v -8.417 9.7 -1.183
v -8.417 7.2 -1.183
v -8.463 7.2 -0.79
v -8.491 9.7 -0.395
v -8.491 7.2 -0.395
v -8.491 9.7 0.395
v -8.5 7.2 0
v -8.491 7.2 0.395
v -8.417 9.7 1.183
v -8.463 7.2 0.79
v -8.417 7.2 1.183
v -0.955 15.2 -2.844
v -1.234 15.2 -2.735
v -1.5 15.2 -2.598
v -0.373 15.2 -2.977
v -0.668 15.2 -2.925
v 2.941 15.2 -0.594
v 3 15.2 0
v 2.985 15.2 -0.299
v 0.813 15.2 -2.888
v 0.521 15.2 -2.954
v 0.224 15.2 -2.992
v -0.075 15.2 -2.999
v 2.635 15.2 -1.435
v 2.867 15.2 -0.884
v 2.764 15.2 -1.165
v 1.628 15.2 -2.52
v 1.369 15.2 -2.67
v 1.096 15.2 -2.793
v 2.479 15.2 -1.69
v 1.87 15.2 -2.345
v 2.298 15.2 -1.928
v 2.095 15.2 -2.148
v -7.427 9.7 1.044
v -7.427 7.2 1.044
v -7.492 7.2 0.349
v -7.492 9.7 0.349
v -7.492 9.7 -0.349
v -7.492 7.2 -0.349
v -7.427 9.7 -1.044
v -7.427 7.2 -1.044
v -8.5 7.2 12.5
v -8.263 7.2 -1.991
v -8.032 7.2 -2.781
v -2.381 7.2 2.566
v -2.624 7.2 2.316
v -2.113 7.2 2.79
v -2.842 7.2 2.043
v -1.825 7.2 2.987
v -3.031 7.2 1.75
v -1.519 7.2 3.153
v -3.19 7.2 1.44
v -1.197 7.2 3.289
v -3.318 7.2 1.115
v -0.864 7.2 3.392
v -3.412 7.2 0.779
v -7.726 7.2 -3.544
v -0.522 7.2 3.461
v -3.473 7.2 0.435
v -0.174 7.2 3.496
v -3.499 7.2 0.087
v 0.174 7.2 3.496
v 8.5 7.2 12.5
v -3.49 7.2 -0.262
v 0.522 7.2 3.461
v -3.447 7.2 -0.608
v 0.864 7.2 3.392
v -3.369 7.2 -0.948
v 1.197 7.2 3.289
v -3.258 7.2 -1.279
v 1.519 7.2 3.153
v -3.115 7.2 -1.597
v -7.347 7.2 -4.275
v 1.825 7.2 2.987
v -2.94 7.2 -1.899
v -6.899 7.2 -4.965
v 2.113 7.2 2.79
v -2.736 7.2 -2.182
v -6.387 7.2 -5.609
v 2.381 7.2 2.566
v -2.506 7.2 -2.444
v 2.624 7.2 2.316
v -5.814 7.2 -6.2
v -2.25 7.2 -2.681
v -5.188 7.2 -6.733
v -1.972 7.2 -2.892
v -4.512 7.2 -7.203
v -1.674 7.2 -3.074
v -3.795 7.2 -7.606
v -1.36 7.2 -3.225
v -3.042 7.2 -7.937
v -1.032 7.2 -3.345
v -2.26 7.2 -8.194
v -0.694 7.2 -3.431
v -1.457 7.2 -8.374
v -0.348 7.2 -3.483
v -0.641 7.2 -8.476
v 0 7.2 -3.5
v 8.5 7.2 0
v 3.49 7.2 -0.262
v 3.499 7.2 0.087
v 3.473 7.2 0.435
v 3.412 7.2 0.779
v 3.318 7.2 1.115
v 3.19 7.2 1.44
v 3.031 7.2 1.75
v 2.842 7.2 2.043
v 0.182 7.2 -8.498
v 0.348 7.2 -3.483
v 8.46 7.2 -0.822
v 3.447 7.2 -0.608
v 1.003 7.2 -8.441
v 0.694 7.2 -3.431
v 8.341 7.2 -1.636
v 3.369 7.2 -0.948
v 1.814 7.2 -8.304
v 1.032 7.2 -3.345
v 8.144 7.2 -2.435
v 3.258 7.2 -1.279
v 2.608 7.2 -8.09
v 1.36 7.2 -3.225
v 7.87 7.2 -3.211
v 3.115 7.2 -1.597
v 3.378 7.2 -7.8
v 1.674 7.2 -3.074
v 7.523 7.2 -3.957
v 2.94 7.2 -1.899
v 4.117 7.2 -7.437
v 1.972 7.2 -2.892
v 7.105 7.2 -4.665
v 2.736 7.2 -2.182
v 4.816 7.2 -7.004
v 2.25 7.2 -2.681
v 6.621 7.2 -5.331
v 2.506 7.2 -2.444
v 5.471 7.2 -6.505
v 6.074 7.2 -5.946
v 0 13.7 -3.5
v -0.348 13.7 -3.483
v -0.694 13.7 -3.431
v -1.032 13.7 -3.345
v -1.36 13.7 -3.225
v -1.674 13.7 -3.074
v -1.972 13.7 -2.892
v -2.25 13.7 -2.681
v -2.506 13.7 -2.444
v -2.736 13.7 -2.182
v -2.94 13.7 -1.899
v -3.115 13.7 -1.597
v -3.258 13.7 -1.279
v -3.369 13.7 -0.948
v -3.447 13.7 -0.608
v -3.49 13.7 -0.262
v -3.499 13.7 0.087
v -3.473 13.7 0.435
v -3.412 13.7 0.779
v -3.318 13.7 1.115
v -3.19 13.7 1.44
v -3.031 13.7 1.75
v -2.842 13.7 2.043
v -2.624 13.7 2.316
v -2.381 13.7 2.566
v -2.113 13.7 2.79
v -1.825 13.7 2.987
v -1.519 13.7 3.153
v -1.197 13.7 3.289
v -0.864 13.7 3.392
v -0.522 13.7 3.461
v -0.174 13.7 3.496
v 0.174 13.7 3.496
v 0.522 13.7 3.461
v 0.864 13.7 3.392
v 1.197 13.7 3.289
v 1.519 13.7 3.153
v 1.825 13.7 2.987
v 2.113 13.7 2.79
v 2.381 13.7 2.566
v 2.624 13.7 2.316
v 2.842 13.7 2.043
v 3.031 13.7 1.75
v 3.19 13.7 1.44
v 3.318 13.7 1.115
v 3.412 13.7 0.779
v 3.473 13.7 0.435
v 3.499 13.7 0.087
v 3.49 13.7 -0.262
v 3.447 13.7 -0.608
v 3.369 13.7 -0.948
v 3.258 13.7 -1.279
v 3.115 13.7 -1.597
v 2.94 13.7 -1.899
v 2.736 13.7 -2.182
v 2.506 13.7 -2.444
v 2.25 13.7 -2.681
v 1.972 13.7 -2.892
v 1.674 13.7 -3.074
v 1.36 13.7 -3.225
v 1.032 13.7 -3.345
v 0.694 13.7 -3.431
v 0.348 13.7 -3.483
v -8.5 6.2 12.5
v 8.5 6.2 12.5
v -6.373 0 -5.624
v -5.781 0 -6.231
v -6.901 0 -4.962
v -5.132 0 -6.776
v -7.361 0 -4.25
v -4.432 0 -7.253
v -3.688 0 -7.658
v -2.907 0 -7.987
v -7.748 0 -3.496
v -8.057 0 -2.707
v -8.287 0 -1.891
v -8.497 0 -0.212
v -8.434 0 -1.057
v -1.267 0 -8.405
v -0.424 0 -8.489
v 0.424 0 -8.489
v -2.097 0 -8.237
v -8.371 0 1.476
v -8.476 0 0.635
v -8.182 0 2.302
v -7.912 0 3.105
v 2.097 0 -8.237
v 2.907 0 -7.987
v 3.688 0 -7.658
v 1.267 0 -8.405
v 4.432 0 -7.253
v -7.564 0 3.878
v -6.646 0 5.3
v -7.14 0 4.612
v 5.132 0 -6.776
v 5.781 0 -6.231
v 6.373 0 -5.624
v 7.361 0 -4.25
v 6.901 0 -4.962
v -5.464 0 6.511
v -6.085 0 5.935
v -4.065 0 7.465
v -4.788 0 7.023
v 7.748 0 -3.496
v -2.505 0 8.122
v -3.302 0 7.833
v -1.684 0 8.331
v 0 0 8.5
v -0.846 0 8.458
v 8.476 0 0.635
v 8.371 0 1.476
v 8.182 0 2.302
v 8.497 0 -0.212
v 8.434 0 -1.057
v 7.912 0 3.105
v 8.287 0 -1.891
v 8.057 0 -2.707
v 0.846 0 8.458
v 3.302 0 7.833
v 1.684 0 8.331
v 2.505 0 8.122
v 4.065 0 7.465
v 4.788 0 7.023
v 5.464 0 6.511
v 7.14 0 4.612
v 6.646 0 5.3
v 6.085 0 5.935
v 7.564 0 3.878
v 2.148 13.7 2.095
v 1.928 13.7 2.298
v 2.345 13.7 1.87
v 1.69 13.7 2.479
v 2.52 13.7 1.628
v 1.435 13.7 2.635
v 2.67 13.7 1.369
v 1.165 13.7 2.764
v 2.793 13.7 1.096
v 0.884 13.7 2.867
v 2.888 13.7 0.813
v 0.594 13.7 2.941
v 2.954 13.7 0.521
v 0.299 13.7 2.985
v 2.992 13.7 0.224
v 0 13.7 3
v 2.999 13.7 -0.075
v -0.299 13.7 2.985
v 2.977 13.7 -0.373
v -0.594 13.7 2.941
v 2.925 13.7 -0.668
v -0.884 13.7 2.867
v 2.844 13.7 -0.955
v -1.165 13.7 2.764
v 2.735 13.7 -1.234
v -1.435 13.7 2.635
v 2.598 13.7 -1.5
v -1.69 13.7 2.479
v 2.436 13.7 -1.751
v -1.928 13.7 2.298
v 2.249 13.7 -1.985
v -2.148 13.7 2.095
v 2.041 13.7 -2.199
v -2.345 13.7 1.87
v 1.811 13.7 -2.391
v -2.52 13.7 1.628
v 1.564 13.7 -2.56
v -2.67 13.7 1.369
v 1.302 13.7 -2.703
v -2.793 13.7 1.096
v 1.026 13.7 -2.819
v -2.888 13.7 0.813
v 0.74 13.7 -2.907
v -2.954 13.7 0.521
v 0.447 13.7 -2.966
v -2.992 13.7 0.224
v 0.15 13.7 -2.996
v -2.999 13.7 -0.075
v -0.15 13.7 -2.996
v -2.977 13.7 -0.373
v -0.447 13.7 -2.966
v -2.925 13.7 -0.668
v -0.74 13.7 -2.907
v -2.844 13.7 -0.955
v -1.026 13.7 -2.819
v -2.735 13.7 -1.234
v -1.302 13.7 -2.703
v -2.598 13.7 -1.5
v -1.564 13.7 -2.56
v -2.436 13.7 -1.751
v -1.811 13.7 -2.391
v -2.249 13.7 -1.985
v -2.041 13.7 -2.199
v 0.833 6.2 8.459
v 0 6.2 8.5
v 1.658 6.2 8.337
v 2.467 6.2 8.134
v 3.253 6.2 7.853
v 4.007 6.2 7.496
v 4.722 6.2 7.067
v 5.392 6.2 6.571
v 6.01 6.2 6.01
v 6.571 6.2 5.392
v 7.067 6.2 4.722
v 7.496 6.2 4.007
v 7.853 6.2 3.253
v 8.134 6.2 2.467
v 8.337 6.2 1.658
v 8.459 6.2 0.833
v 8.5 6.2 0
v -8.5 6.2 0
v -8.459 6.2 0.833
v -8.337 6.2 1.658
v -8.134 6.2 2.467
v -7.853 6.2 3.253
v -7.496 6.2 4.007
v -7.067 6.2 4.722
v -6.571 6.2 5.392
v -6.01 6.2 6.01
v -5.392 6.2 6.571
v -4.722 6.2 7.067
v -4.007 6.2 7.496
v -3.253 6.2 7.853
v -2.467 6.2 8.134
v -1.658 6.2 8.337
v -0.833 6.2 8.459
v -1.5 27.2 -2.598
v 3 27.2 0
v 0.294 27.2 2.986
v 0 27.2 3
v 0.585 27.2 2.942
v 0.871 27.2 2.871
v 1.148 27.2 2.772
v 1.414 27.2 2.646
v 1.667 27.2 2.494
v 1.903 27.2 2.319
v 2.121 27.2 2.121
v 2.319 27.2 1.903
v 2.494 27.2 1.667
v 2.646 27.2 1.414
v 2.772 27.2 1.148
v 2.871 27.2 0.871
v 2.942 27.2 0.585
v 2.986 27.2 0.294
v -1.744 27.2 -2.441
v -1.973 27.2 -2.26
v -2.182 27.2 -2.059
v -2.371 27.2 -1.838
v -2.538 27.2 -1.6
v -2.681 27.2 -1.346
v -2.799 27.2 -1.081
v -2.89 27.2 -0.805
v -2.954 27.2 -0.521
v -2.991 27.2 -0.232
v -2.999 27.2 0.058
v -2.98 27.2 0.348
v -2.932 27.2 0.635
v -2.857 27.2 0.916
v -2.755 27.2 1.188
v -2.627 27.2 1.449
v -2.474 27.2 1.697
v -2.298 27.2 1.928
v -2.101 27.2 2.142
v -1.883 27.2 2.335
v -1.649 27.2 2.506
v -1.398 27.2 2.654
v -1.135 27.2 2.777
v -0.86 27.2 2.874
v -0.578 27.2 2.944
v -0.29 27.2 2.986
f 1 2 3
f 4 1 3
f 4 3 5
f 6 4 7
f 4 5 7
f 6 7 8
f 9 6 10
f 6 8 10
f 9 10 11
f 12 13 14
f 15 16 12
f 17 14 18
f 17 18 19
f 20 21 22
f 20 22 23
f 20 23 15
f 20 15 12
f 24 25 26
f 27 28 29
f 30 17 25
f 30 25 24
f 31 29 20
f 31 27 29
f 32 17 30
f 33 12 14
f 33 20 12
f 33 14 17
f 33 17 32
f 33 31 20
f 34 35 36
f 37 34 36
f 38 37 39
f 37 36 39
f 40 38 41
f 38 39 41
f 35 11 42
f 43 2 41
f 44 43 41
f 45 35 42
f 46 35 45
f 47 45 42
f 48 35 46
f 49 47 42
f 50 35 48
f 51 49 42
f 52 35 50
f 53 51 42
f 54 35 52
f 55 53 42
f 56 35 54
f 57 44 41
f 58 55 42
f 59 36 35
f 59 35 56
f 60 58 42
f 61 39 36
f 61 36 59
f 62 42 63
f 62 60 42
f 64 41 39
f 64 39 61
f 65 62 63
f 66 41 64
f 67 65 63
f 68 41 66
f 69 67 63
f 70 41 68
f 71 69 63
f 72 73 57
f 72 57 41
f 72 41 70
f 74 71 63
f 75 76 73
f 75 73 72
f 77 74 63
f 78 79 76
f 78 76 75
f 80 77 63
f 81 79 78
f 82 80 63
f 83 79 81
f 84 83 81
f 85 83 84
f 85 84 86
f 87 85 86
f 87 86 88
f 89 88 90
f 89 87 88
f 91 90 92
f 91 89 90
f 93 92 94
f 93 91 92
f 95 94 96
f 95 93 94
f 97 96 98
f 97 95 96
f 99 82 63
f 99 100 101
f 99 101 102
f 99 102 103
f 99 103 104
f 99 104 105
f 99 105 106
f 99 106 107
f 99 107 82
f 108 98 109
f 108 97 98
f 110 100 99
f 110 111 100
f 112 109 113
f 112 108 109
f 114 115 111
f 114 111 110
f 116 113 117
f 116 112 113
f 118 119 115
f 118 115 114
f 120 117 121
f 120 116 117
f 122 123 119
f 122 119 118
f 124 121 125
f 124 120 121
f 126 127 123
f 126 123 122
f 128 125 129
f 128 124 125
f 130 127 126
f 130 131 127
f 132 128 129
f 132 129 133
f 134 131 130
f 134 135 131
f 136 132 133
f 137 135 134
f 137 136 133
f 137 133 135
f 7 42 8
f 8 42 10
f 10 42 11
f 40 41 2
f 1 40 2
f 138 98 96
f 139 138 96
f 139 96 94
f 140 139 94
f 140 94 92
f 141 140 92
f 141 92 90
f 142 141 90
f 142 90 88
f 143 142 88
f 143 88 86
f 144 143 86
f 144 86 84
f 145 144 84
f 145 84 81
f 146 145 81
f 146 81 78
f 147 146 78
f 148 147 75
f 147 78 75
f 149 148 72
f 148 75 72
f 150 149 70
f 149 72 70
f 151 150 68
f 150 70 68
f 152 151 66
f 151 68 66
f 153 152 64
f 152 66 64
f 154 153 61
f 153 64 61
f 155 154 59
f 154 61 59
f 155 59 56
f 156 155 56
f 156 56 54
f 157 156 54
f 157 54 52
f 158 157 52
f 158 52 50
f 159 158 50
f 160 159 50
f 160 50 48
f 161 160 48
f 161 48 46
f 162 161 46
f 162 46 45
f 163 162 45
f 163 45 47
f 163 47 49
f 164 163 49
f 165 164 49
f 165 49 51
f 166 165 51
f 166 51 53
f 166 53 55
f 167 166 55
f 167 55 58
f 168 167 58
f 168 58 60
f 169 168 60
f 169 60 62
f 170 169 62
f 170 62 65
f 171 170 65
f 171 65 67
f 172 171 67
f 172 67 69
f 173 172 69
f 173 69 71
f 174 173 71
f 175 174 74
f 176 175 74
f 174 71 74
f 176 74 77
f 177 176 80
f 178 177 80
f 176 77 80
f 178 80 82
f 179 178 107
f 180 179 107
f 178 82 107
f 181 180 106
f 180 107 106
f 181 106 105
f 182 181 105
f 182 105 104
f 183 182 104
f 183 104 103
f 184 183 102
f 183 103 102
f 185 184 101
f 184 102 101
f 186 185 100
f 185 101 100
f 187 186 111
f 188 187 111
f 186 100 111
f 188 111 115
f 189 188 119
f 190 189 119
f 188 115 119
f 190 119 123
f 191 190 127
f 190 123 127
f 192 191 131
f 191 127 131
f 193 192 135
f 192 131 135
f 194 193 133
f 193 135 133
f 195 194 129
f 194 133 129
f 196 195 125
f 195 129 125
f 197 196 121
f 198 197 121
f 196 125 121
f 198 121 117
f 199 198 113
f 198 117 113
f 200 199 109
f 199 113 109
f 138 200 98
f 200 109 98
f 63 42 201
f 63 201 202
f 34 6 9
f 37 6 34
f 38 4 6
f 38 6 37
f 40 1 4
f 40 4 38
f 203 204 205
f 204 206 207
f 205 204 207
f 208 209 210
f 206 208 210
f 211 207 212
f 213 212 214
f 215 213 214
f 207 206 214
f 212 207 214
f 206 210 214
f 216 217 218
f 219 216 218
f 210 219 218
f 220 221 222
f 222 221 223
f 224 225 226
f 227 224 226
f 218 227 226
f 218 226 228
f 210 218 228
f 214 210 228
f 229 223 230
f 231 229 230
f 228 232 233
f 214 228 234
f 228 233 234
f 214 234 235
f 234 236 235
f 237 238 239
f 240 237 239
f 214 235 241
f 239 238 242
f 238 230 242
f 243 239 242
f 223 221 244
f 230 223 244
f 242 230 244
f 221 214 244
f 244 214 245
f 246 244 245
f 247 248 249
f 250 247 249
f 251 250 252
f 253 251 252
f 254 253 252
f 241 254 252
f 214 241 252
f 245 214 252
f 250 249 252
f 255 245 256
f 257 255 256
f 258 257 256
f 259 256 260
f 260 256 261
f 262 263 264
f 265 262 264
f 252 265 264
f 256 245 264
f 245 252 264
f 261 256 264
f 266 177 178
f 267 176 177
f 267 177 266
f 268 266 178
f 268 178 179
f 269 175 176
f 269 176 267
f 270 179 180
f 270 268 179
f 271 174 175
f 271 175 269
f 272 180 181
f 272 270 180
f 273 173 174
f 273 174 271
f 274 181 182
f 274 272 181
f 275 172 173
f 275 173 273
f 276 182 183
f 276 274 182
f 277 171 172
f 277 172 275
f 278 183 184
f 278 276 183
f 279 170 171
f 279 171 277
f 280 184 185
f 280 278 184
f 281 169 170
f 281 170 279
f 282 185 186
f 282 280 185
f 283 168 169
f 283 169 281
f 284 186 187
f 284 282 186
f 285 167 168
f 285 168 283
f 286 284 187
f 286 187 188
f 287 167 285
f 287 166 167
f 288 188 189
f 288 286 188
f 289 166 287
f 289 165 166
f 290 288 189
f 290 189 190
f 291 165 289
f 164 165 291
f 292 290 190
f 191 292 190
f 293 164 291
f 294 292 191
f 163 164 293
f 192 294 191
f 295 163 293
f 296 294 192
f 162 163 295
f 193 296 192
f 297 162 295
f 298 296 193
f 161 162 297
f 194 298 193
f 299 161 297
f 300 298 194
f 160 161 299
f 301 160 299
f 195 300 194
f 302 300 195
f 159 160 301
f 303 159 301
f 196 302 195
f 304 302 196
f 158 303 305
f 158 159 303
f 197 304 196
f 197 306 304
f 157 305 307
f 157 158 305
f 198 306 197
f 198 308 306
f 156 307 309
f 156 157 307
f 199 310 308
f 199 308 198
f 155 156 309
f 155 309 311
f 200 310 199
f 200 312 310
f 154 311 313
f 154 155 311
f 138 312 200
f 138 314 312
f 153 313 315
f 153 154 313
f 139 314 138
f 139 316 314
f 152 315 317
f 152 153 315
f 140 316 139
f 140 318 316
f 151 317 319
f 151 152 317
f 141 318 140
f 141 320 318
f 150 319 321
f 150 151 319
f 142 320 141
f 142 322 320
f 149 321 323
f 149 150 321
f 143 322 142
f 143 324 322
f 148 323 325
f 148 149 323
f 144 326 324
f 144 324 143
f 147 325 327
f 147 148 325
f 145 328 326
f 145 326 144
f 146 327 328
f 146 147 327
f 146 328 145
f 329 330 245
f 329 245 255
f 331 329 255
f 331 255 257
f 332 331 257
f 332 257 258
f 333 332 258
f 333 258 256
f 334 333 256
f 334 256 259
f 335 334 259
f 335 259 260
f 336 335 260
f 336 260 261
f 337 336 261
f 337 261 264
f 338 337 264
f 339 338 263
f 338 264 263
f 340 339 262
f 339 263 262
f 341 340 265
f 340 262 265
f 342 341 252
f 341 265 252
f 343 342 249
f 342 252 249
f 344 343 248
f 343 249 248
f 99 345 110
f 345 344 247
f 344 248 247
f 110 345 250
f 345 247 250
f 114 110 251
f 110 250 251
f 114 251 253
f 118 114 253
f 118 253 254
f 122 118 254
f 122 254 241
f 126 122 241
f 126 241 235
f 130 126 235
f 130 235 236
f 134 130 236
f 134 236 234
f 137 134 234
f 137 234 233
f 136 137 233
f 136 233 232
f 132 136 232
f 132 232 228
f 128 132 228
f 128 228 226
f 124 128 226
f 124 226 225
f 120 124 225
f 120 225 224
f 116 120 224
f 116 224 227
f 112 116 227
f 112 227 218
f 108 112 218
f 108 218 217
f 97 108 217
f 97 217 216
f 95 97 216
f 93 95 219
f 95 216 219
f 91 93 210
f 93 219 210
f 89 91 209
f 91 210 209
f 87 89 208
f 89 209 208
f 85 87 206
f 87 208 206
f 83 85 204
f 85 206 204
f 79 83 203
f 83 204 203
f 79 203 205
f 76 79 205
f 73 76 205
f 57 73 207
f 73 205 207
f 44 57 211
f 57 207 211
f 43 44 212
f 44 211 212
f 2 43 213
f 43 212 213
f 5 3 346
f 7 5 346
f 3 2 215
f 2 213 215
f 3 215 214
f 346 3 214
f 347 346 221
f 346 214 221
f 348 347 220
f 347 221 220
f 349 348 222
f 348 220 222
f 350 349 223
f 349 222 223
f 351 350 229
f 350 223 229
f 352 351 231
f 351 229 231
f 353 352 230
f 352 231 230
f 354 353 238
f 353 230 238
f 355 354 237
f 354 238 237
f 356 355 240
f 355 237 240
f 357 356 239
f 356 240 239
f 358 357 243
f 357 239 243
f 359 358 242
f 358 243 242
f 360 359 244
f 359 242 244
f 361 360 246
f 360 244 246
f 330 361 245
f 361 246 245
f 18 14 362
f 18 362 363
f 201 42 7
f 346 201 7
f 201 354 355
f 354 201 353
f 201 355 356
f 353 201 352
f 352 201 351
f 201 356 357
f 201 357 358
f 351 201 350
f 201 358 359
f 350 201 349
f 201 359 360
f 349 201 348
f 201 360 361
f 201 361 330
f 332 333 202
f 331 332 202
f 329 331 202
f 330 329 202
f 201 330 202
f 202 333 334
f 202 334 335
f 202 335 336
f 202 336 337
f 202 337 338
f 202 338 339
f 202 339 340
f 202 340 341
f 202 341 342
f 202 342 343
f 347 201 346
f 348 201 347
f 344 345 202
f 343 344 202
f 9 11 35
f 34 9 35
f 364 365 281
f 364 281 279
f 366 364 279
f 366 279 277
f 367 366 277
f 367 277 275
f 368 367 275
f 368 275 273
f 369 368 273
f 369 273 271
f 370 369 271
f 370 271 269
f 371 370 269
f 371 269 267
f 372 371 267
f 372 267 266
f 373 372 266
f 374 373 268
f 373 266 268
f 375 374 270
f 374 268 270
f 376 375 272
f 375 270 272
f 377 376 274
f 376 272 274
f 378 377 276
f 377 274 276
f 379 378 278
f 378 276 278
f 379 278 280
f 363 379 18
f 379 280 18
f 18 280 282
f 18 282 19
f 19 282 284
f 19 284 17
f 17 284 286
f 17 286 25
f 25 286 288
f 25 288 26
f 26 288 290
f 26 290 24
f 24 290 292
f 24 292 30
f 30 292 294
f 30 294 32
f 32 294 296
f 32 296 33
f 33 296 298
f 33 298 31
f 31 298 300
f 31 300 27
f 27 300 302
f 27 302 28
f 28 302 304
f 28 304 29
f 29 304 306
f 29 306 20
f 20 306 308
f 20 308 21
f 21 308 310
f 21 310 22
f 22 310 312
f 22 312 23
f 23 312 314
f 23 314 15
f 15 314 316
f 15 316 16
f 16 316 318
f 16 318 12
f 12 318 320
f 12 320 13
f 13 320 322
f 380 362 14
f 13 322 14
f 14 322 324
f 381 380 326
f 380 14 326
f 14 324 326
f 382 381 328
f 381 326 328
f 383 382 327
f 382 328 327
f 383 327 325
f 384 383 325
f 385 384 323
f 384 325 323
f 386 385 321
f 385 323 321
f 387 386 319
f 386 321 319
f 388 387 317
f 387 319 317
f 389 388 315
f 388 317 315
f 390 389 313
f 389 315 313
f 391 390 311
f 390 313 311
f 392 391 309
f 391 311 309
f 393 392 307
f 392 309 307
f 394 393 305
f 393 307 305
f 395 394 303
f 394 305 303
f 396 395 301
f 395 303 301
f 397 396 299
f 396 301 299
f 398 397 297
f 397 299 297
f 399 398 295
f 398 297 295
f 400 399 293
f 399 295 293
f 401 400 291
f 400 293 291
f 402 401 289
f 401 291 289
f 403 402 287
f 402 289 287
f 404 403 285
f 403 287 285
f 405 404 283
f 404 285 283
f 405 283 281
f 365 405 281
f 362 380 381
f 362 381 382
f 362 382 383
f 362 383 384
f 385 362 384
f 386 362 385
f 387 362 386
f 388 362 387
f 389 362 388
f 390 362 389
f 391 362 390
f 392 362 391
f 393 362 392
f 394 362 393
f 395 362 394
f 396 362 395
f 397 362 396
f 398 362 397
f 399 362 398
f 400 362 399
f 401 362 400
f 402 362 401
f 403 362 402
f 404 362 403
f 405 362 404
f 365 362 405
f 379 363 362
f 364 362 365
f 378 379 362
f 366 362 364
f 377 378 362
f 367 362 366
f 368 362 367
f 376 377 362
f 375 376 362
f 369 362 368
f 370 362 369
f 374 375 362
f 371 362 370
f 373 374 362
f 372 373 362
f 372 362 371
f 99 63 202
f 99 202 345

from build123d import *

# Parameters (mm, degrees)
SKETCH_1_R          = 8.5
EXTRUDE_1_DEPTH     = 7.2
EXTRUDE_2_DEPTH     = 2.5
SKETCH_3_R          = 3.5
EXTRUDE_3_DEPTH     = 6.5
SKETCH_4_R          = 3
EXTRUDE_4_DEPTH     = 13.5
CUT_EXTRUDE_START   = -12
CUT_EXTRUDE_1_DEPTH = 12
SKETCH_6_W          = 17
SKETCH_6_H          = 12.5
EXTRUDE_5_DEPTH     = 1


with BuildPart() as part:
    # 草图1 → 凸台-拉伸1 (new body)
    with BuildSketch(Plane(origin=(0, 0, 0), x_dir=(1, 0, 0), z_dir=(0, 1, 0))):
        with Locations(Location((0, 0, 0), (0, 0, 270))):
            Circle(SKETCH_1_R)
    extrude(amount=EXTRUDE_1_DEPTH)

    # 草图2 → 凸台-拉伸2 (add)
    with BuildSketch(Plane(origin=(0, 7.2, 0), x_dir=(1, 0, 0), z_dir=(0, 1, 0))):
        with BuildLine():
            Line((-7.427010516, 1.043798257), (-8.417278584, 1.182971358))
            ThreePointArc((-8.417278584, 1.182971358), (-8.5, 0), (-8.417278584, -1.182971358))
            Line((-8.417278584, -1.182971358), (-7.427010516, -1.043798257))
            ThreePointArc((-7.427010516, -1.043798257), (-7.5, 0), (-7.427010516, 1.043798257))
        make_face()
    extrude(amount=EXTRUDE_2_DEPTH)

    # 草图3 → 凸台-拉伸3 (add)
    with BuildSketch(Plane(origin=(0, 7.2, 0), x_dir=(1, 0, 0), z_dir=(0, 1, 0))):
        with Locations(Location((0, 0, 0), (0, 0, 90))):
            Circle(SKETCH_3_R)
    extrude(amount=EXTRUDE_3_DEPTH)

    # 草图4 → 凸台-拉伸4 (add)
    with BuildSketch(Plane(origin=(0, 13.7, 0), x_dir=(1, 0, 0), z_dir=(0, 1, 0))):
        with Locations(Location((0, 0, 0), (0, 0, 270))):
            Circle(SKETCH_4_R)
    extrude(amount=EXTRUDE_4_DEPTH)

    # 草图5 → 切除-拉伸1 (cut)
    with BuildSketch(Plane(origin=(0, 27.2, 0), x_dir=(1, 0, 0), z_dir=(0, 1, 0)).offset(CUT_EXTRUDE_START)):
        with BuildLine():
            Line((-1.5, 2.598076211), (3, 0))
            ThreePointArc((3, 0), (1.5, 2.598076211), (-1.5, 2.598076211))
        make_face()
    extrude(amount=CUT_EXTRUDE_1_DEPTH, mode=Mode.SUBTRACT)

    # 草图6 → 凸台-拉伸5 (add)
    with BuildSketch(Plane(origin=(0, 7.2, 0), x_dir=(1, 0, 0), z_dir=(0, 1, 0))):
        with Locations((0, -6.25)):
            Rectangle(SKETCH_6_W, SKETCH_6_H)
    extrude(amount=-EXTRUDE_5_DEPTH)


solid = part.part
